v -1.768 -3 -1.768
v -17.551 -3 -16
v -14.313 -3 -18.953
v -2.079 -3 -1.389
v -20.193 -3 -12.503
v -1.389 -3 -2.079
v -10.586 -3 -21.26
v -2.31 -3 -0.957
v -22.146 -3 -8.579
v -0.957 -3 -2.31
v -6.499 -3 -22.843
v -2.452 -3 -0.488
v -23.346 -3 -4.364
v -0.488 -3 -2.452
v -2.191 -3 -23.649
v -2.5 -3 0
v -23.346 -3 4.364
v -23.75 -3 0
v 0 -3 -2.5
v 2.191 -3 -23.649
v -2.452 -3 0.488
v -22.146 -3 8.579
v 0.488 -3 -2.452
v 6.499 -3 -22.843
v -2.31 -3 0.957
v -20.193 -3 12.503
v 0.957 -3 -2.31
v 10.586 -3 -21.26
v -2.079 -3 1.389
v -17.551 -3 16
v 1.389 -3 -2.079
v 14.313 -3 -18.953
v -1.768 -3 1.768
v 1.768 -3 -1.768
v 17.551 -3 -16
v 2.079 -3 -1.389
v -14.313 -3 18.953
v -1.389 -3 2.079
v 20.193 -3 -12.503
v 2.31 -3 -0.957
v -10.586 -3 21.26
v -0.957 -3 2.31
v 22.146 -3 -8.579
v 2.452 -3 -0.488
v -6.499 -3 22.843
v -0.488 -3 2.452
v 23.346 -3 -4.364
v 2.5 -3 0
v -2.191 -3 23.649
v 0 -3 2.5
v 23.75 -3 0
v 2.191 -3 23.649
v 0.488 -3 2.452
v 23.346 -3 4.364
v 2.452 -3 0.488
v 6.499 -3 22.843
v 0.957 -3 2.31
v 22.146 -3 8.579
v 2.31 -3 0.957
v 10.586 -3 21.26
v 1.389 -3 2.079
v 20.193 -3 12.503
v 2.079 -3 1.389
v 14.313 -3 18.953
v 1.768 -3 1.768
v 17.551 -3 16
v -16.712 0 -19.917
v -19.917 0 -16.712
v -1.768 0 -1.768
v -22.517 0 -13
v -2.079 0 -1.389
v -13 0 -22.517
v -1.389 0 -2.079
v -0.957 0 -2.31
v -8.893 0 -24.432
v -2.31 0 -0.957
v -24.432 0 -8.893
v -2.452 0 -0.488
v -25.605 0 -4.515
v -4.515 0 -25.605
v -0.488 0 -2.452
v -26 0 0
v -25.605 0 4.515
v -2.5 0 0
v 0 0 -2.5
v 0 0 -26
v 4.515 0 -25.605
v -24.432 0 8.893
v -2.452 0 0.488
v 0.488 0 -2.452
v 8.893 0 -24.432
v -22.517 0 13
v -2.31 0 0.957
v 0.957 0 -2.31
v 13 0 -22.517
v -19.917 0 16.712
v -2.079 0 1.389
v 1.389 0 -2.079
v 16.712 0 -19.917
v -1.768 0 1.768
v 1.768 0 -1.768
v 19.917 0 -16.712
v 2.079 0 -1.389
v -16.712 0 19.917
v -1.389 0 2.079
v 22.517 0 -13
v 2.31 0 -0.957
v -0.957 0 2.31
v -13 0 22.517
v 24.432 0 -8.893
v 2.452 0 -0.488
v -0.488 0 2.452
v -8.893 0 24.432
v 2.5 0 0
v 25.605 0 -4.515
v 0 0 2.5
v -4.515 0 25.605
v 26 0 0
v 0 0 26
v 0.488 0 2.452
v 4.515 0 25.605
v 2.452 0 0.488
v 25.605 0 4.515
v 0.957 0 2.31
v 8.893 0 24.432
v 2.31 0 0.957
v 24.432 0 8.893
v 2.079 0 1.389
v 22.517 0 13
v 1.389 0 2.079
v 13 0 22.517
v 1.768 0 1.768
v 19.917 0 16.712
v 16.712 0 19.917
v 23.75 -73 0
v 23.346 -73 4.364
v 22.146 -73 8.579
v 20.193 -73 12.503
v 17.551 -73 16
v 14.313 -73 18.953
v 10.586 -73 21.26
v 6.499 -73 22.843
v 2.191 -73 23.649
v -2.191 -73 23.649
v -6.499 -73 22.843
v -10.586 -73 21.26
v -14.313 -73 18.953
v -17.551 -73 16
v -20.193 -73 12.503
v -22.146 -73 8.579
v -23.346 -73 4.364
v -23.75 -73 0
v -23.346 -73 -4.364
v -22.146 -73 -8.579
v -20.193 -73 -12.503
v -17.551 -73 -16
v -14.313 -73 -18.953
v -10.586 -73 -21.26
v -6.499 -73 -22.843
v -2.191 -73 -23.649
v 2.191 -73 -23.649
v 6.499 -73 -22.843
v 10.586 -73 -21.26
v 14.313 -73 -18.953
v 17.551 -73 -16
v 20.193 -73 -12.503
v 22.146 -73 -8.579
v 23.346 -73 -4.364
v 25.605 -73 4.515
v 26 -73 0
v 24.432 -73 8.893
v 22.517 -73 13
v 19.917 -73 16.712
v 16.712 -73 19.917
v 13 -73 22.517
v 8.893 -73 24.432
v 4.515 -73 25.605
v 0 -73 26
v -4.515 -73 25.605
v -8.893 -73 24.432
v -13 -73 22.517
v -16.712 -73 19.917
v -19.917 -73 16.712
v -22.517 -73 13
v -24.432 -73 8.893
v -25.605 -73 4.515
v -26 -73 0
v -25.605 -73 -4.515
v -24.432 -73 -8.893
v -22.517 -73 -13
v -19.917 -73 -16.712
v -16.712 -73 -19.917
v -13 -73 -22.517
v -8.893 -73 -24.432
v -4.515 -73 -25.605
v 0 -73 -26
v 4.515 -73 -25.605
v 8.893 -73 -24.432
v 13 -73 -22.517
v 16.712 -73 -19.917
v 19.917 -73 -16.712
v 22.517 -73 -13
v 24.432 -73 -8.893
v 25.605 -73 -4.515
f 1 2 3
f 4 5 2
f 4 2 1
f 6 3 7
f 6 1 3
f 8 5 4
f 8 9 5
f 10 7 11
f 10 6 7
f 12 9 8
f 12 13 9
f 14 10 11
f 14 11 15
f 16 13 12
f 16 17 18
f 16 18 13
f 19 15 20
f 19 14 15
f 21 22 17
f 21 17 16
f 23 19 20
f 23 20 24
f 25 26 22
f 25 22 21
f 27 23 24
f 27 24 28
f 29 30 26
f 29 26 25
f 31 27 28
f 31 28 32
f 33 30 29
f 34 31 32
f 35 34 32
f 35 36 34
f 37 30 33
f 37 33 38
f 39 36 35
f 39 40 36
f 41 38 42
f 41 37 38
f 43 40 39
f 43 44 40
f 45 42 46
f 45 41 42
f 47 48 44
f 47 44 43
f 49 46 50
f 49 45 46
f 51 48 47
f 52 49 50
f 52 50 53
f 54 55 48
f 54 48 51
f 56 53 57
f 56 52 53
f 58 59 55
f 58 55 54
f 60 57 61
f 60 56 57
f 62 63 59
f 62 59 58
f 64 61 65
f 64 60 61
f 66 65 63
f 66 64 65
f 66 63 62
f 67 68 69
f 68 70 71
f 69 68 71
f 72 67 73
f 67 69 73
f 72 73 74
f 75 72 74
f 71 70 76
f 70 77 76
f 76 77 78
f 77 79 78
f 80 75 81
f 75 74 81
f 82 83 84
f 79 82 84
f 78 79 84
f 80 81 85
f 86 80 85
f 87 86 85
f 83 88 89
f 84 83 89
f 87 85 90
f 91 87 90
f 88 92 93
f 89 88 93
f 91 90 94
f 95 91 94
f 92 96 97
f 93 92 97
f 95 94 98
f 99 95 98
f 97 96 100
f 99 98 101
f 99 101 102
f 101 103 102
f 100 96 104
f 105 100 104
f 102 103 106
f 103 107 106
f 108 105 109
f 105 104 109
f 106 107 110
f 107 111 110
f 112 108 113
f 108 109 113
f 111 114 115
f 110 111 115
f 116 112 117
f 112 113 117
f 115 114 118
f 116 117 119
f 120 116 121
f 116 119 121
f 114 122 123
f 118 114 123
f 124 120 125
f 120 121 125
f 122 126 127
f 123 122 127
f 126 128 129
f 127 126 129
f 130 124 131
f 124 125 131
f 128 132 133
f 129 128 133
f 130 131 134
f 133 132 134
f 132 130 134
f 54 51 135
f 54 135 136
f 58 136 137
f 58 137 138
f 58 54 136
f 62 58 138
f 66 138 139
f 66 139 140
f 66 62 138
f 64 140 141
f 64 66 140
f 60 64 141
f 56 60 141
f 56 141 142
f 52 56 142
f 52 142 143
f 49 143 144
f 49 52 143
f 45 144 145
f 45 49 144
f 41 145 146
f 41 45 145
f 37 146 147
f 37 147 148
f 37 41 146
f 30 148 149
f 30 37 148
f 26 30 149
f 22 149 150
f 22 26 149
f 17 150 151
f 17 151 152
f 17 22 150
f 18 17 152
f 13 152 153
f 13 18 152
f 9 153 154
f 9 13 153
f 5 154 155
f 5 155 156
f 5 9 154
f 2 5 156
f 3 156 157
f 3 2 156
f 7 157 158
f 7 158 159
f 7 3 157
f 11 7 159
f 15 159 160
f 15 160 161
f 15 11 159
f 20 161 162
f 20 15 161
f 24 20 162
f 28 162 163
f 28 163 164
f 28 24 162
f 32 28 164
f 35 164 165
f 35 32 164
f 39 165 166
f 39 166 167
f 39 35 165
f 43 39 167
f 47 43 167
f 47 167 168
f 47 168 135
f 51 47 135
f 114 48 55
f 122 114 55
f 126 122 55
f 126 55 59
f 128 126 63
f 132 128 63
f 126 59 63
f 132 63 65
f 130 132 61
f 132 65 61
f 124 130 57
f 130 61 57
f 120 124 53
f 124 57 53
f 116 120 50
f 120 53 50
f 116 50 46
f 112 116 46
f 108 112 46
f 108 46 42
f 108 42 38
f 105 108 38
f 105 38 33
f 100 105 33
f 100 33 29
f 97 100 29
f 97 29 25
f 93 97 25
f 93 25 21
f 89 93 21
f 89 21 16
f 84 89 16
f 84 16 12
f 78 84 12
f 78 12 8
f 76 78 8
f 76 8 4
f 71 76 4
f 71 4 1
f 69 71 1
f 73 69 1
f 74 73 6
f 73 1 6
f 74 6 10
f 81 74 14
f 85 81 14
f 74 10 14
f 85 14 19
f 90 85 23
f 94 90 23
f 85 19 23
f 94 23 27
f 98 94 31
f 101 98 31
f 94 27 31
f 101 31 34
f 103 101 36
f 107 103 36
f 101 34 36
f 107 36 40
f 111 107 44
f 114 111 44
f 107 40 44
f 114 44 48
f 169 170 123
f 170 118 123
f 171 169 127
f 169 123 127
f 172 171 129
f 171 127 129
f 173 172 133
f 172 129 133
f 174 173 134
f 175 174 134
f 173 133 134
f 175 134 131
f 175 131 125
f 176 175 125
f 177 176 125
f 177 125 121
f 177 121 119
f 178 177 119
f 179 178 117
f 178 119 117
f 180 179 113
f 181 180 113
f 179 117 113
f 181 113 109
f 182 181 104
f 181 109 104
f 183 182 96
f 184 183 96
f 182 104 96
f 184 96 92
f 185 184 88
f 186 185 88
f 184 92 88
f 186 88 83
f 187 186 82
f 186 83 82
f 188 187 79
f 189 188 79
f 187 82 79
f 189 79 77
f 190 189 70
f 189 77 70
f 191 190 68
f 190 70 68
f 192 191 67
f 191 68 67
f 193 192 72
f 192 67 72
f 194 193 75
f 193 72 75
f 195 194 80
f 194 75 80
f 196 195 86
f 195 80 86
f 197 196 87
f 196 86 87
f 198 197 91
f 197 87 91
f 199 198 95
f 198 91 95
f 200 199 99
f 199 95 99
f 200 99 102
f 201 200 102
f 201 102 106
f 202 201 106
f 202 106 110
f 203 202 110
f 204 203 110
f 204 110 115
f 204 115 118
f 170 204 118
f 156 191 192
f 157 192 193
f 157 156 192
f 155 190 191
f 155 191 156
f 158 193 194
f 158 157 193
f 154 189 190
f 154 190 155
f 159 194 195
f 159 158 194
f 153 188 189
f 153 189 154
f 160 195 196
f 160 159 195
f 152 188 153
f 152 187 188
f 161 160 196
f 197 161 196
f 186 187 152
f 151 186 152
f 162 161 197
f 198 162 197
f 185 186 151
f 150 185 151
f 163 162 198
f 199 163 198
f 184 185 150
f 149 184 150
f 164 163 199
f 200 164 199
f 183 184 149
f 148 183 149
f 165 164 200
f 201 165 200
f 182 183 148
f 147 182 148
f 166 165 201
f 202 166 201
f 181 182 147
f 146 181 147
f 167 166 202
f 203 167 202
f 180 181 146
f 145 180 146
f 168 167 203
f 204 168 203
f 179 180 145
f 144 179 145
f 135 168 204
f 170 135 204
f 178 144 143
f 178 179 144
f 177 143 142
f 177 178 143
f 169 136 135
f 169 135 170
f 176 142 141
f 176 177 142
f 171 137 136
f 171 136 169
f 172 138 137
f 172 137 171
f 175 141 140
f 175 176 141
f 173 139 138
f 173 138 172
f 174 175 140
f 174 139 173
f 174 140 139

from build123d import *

# Parameters (mm, degrees)
F0_R     = 26
F1_DEPTH = 3
F2_R     = 26
F2_R_2   = 23.75
F3_DEPTH = 70
F5_D     = 5


with BuildPart() as f1:
    # F0 (on Front) → F1 (new body)
    with BuildSketch(Plane.XZ):
        Circle(F0_R)
    extrude(amount=F1_DEPTH)

    # F2 (on face) → F3 (join)
    with BuildSketch(Plane.XZ.offset(3)):
        Circle(F2_R)
        Circle(F2_R_2, mode=Mode.SUBTRACT)
    extrude(amount=F3_DEPTH)

    # F5 (through all)
    with Locations(Plane(origin=(0, 0, 0), x_dir=(-1, 0, 0), z_dir=(0, 1, 0))):
        with Locations((0, 0)):
            Hole(F5_D / 2)


solid = f1.part
